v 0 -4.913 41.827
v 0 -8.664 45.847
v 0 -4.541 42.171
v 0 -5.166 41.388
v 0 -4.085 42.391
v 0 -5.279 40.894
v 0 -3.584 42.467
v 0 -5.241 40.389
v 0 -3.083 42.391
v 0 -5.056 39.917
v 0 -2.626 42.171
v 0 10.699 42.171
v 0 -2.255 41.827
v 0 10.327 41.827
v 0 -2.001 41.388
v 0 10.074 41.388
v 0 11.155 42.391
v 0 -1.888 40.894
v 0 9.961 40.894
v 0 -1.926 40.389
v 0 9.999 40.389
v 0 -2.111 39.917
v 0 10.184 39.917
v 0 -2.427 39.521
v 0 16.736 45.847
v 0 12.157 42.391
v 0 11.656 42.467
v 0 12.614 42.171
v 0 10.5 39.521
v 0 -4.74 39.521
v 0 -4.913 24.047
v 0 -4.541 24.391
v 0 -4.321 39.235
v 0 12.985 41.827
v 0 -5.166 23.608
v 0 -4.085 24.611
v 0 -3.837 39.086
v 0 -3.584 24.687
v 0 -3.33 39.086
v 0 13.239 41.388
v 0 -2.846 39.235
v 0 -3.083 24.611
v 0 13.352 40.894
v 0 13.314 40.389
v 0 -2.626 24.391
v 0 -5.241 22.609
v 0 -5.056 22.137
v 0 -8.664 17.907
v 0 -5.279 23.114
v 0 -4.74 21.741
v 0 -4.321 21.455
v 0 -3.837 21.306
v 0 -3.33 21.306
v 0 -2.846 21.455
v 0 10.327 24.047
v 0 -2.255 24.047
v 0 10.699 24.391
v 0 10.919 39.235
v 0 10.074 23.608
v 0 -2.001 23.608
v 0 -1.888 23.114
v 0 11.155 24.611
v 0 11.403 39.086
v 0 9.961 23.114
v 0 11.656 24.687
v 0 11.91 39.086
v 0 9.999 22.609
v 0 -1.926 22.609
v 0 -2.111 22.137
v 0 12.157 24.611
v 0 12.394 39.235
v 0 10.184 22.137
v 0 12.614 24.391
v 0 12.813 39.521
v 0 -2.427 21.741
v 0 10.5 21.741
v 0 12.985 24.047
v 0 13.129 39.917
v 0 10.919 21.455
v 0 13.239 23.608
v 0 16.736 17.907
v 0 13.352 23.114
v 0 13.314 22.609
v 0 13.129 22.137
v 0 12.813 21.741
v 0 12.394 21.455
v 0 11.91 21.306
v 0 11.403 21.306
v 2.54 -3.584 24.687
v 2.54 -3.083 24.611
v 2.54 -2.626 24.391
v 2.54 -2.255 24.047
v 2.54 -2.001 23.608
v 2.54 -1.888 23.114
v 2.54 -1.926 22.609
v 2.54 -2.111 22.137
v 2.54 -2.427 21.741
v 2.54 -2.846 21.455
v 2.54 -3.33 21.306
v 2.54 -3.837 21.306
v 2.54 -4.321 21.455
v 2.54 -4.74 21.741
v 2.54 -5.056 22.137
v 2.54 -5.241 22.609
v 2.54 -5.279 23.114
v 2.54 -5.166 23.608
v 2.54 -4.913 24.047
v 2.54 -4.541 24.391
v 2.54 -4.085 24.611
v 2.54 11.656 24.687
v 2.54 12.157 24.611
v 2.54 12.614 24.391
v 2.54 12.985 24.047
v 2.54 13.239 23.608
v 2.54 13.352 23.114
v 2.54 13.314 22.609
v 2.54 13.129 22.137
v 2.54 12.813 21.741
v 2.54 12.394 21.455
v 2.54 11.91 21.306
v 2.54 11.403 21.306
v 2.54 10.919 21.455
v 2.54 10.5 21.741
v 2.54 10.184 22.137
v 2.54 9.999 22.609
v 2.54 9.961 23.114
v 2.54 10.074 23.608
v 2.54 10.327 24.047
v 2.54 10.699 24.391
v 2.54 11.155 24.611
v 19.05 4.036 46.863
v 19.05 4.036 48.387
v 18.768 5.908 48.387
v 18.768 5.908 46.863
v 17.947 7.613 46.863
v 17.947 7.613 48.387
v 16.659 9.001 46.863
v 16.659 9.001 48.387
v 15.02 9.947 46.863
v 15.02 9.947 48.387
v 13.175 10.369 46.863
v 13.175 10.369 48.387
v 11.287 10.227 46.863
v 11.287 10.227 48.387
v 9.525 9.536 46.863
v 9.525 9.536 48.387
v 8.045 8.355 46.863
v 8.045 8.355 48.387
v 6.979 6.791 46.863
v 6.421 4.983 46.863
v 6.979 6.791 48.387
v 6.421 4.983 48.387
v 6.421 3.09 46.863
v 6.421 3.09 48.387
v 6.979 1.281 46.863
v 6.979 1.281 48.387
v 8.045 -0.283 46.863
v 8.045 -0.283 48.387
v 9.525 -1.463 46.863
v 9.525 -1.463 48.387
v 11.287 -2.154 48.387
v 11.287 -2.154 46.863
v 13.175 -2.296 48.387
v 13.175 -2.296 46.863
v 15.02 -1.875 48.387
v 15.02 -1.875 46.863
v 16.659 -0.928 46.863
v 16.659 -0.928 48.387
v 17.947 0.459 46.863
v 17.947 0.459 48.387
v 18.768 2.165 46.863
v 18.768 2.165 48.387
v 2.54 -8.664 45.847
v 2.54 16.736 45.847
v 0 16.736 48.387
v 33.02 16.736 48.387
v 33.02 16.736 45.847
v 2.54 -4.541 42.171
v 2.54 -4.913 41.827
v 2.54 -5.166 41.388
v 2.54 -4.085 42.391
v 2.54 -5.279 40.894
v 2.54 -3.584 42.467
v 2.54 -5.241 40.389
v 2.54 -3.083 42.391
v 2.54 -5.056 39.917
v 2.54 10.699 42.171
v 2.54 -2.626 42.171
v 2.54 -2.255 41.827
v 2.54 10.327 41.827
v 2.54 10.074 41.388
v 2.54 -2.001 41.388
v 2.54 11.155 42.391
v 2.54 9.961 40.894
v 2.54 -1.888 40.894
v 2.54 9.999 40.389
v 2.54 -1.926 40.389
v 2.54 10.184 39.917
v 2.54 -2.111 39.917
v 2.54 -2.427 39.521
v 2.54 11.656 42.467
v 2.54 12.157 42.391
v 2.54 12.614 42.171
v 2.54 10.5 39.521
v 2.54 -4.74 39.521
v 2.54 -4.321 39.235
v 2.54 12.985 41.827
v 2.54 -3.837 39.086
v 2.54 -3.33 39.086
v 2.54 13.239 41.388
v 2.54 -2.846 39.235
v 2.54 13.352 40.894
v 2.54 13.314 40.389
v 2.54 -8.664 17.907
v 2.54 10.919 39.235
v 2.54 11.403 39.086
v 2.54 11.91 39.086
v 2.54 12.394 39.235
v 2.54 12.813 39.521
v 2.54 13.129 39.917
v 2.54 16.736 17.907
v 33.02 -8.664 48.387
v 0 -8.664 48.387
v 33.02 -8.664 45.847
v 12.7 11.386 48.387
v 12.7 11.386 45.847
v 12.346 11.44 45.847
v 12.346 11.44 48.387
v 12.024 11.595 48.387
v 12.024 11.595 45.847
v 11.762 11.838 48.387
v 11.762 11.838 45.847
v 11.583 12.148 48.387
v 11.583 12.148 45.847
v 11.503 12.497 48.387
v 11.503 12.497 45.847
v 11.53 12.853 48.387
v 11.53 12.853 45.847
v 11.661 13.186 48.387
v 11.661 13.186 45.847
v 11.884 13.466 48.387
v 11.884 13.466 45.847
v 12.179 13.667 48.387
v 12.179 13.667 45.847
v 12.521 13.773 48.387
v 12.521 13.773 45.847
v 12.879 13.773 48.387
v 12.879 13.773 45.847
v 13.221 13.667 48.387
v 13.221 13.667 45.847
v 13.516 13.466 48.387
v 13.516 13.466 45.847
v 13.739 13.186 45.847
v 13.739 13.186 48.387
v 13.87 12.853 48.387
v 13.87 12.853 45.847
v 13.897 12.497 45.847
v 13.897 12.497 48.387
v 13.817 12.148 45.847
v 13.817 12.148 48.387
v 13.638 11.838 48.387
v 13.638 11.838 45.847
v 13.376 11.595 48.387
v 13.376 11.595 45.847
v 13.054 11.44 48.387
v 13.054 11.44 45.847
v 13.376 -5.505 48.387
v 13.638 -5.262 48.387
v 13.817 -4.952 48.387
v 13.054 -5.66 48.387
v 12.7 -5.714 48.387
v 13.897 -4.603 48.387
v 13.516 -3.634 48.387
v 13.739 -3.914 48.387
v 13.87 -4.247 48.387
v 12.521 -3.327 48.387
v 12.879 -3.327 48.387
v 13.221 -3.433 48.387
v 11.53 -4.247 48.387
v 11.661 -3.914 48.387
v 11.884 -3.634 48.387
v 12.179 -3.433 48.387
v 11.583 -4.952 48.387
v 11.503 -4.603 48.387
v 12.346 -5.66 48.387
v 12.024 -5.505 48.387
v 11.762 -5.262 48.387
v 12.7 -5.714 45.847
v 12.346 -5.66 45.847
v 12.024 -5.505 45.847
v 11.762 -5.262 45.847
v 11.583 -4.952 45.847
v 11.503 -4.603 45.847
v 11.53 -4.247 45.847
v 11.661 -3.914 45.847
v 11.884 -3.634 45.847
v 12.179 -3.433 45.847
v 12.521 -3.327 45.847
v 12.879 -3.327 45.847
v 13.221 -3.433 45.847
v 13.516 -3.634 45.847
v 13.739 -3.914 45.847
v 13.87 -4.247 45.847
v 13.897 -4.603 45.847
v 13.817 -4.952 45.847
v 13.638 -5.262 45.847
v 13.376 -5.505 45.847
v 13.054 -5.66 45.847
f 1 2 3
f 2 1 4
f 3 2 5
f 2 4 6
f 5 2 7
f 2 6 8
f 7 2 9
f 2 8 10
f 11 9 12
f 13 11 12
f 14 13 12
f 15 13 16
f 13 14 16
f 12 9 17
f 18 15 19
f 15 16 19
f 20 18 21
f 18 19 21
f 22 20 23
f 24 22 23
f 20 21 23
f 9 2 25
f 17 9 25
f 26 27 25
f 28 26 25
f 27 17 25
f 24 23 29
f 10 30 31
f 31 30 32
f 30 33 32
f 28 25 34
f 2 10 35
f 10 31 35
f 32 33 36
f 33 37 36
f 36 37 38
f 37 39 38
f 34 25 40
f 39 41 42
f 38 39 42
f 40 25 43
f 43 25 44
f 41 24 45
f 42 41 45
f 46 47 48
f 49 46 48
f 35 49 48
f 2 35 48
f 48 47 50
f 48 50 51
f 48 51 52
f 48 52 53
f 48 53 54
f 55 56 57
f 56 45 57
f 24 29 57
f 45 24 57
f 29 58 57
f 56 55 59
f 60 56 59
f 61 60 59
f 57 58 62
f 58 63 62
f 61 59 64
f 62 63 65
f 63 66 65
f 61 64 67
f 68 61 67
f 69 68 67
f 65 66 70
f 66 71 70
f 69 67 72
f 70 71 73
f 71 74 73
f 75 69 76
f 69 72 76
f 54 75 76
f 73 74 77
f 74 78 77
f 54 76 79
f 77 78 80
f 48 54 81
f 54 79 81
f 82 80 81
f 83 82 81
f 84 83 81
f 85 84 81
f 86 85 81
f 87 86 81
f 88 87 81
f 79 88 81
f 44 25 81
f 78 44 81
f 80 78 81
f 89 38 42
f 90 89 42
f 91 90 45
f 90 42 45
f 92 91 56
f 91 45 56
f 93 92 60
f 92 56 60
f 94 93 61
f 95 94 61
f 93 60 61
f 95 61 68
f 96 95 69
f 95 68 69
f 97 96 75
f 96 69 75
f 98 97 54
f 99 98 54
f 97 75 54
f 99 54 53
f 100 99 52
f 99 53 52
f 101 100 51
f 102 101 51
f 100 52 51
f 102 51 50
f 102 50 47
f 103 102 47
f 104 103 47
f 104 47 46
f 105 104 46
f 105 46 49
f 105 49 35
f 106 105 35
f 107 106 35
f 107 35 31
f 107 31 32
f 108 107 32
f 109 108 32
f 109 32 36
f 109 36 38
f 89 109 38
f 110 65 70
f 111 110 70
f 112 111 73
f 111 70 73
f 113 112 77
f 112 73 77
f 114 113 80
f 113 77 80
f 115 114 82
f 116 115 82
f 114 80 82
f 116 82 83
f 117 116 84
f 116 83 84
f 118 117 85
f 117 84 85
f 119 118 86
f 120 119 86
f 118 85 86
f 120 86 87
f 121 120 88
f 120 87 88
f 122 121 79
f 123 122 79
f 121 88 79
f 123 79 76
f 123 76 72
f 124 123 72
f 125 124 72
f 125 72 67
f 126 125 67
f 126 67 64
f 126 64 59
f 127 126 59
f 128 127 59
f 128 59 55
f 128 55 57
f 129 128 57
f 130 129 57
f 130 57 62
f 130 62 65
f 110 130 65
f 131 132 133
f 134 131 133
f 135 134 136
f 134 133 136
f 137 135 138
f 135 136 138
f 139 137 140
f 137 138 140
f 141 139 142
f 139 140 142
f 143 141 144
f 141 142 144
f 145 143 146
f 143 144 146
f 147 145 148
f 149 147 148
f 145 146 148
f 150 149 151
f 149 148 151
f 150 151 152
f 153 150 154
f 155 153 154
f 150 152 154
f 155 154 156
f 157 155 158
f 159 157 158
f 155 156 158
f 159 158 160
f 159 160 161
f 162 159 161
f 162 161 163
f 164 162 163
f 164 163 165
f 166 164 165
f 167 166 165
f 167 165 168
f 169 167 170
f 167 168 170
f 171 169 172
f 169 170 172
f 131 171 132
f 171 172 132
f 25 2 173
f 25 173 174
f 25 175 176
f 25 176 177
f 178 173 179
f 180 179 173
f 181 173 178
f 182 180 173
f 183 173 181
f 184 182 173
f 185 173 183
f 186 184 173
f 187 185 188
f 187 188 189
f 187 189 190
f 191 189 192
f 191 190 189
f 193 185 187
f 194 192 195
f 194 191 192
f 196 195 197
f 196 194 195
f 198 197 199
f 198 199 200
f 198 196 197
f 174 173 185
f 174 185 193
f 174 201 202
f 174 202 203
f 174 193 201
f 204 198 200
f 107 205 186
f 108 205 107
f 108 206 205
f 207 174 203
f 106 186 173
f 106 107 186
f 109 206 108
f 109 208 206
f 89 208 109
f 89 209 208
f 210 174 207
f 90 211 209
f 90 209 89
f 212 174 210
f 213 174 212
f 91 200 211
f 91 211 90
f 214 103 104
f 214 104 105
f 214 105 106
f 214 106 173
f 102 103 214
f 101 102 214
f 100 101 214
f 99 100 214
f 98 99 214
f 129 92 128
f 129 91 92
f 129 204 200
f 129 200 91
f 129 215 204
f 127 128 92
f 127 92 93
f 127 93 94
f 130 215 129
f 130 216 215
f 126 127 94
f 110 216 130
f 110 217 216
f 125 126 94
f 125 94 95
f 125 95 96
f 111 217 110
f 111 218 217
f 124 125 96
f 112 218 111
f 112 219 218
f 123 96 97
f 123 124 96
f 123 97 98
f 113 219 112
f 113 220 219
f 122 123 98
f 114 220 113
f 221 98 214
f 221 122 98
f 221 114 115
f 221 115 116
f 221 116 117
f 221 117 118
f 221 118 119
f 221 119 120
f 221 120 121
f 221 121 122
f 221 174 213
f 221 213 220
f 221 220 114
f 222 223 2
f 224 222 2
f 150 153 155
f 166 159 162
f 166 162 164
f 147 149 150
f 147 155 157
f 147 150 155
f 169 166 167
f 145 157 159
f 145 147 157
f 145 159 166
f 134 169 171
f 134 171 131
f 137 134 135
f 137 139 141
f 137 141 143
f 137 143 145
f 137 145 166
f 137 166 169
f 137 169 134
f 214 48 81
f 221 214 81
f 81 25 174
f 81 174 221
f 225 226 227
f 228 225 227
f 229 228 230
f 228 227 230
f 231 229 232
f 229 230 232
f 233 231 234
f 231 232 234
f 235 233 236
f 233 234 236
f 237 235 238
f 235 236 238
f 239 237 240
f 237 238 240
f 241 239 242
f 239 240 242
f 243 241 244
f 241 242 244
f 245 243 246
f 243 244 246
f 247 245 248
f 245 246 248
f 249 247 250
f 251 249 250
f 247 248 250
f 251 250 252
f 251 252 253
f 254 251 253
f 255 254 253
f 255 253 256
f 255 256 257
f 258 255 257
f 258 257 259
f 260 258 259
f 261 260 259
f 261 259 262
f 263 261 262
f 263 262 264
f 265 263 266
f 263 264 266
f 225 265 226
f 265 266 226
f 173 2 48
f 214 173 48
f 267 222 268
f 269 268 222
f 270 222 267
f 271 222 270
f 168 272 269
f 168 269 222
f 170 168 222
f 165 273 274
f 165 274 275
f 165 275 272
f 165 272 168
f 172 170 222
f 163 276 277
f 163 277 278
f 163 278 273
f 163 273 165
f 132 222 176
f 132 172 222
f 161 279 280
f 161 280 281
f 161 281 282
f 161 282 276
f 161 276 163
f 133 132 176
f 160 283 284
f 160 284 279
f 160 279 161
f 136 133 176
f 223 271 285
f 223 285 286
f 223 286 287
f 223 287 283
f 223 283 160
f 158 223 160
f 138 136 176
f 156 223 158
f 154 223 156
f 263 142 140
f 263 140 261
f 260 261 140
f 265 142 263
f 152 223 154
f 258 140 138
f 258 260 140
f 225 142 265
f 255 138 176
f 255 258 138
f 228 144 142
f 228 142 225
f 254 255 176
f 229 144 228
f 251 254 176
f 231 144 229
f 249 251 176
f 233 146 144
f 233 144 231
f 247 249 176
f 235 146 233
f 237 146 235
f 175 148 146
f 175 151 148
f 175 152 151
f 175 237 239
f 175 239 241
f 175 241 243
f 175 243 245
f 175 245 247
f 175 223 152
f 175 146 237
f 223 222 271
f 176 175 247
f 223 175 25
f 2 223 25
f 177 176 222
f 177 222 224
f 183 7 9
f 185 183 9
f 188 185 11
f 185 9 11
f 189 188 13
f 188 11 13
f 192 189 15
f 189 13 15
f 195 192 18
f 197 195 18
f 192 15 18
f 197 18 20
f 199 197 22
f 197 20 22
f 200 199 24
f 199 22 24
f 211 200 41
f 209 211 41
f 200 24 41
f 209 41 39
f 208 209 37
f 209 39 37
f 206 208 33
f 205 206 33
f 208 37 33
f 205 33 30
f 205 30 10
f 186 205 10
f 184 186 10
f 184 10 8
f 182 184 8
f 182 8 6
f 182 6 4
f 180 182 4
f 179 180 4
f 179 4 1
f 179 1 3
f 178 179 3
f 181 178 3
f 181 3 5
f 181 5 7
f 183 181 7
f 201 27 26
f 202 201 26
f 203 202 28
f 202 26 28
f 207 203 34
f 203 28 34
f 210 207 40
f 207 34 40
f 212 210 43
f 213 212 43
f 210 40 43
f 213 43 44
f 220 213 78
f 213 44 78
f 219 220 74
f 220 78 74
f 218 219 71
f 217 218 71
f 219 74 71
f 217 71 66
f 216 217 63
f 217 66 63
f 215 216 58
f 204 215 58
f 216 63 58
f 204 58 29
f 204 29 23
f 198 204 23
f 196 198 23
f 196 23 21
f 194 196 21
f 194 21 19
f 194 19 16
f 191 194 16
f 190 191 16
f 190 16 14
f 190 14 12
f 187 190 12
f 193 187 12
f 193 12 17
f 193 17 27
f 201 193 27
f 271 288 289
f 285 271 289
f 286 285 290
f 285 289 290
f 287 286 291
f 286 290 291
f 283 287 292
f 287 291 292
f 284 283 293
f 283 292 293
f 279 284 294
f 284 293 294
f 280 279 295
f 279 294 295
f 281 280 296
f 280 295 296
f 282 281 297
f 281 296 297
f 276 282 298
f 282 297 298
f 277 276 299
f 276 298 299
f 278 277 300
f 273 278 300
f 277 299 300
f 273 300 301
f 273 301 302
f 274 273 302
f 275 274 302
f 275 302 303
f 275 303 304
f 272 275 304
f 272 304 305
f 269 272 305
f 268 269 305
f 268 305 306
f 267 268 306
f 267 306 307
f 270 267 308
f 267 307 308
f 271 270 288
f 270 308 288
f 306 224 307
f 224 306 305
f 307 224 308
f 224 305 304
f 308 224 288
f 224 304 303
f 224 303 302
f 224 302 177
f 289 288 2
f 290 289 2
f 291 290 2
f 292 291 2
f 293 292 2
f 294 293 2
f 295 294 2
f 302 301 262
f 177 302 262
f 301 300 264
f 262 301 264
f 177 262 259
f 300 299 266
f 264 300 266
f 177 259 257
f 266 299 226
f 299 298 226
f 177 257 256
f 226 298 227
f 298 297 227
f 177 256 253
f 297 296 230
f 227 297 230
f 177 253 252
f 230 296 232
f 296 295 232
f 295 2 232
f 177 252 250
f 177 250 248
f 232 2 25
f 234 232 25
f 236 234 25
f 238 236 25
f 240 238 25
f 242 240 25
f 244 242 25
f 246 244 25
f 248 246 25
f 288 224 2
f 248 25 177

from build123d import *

# Parameters (mm, degrees)
SKETCH1_W                           = 27.94
SKETCH1_H                           = 25.4
SIDE_CONNECTING_TO_GRIP_DEPTH       = 2.54
M3_CLEARANCE_HOLE1_D                = 3.4
SIDE_CONNECTING_TO_SERVO_DEPTH      = 30.48
SIDE_CONNECTING_TO_SERVO_DEPTH_BACK = 2.54
SKETCH6_W                           = 2.54
SKETCH6_H                           = 25.4
SKETCH9_W                           = 1.2
SKETCH9_H                           = 30.48
CUTOUT_SERVO_HOLES_AT_2_COUNT       = 2
CUTOUT_SERVO_HOLES_AT_2_PITCH       = 17.1
SKETCH10_R                          = 6.35
CUT_EXTRUDE1_DEPTH                  = 1.524


with BuildPart() as part:
    # Sketch1 → side connecting to grip (new body)
    with BuildSketch(Plane(origin=(0, 0, 0), x_dir=(0, 0, -1), z_dir=(1, 0, 0))):
        with Locations((-31.87684378, 4.036305379)):
            Rectangle(SKETCH1_W, SKETCH1_H)
    extrude(amount=SIDE_CONNECTING_TO_GRIP_DEPTH)

    # M3 Clearance Hole1 (through all)
    with Locations(Plane(origin=(2.54, 0, 0), x_dir=(0, 0, -1), z_dir=(1, 0, 0))):
        with Locations((-40.76684378, 11.656305379), (-22.98684378, 11.656305379), (-22.98684378, -3.583694621), (-40.76684378, -3.583694621)):
            Hole(M3_CLEARANCE_HOLE1_D / 2)


with BuildPart() as body_2:
    # Sketch6 → side connecting to servo (new, two sides: drawn at the far end of the back side and taken through both)
    with BuildSketch(Plane(origin=(2.54, 0, 0), x_dir=(0, 0, -1), z_dir=(1, 0, 0)).offset(-SIDE_CONNECTING_TO_SERVO_DEPTH_BACK)):
        with Locations((-47.11684378, 4.036305379)):
            Rectangle(SKETCH6_W, SKETCH6_H)
    extrude(amount=SIDE_CONNECTING_TO_SERVO_DEPTH + SIDE_CONNECTING_TO_SERVO_DEPTH_BACK)

    # Sketch9 → cutout servo holes (revolve, cut)
    with BuildSketch(Plane(origin=(12.7, 12.586305379, 48.38684378), x_dir=(0, -1, 0), z_dir=(1, 0, 0))):
        with Locations((0.6, 15.24)):
            Rectangle(SKETCH9_W, SKETCH9_H)
    cutout_servo_holes = revolve(axis=Axis((12.7, 12.586305379, 54.73684378), (0, 0, -1)), mode=Mode.SUBTRACT)

    # cutout servo holes at 2: cutout servo holes ×2
    with Locations(*[(0, -i * CUTOUT_SERVO_HOLES_AT_2_PITCH, 0) for i in range(1, CUTOUT_SERVO_HOLES_AT_2_COUNT)]):
        add(cutout_servo_holes, mode=Mode.SUBTRACT)

    # Sketch10 → Cut-Extrude1 (cut)
    with BuildSketch(Plane.XY.offset(48.38684378)):
        with Locations((12.7, 4.036305379)):
            Circle(SKETCH10_R)
    extrude(amount=-CUT_EXTRUDE1_DEPTH, mode=Mode.SUBTRACT)


solid = Compound([part.part, body_2.part])
